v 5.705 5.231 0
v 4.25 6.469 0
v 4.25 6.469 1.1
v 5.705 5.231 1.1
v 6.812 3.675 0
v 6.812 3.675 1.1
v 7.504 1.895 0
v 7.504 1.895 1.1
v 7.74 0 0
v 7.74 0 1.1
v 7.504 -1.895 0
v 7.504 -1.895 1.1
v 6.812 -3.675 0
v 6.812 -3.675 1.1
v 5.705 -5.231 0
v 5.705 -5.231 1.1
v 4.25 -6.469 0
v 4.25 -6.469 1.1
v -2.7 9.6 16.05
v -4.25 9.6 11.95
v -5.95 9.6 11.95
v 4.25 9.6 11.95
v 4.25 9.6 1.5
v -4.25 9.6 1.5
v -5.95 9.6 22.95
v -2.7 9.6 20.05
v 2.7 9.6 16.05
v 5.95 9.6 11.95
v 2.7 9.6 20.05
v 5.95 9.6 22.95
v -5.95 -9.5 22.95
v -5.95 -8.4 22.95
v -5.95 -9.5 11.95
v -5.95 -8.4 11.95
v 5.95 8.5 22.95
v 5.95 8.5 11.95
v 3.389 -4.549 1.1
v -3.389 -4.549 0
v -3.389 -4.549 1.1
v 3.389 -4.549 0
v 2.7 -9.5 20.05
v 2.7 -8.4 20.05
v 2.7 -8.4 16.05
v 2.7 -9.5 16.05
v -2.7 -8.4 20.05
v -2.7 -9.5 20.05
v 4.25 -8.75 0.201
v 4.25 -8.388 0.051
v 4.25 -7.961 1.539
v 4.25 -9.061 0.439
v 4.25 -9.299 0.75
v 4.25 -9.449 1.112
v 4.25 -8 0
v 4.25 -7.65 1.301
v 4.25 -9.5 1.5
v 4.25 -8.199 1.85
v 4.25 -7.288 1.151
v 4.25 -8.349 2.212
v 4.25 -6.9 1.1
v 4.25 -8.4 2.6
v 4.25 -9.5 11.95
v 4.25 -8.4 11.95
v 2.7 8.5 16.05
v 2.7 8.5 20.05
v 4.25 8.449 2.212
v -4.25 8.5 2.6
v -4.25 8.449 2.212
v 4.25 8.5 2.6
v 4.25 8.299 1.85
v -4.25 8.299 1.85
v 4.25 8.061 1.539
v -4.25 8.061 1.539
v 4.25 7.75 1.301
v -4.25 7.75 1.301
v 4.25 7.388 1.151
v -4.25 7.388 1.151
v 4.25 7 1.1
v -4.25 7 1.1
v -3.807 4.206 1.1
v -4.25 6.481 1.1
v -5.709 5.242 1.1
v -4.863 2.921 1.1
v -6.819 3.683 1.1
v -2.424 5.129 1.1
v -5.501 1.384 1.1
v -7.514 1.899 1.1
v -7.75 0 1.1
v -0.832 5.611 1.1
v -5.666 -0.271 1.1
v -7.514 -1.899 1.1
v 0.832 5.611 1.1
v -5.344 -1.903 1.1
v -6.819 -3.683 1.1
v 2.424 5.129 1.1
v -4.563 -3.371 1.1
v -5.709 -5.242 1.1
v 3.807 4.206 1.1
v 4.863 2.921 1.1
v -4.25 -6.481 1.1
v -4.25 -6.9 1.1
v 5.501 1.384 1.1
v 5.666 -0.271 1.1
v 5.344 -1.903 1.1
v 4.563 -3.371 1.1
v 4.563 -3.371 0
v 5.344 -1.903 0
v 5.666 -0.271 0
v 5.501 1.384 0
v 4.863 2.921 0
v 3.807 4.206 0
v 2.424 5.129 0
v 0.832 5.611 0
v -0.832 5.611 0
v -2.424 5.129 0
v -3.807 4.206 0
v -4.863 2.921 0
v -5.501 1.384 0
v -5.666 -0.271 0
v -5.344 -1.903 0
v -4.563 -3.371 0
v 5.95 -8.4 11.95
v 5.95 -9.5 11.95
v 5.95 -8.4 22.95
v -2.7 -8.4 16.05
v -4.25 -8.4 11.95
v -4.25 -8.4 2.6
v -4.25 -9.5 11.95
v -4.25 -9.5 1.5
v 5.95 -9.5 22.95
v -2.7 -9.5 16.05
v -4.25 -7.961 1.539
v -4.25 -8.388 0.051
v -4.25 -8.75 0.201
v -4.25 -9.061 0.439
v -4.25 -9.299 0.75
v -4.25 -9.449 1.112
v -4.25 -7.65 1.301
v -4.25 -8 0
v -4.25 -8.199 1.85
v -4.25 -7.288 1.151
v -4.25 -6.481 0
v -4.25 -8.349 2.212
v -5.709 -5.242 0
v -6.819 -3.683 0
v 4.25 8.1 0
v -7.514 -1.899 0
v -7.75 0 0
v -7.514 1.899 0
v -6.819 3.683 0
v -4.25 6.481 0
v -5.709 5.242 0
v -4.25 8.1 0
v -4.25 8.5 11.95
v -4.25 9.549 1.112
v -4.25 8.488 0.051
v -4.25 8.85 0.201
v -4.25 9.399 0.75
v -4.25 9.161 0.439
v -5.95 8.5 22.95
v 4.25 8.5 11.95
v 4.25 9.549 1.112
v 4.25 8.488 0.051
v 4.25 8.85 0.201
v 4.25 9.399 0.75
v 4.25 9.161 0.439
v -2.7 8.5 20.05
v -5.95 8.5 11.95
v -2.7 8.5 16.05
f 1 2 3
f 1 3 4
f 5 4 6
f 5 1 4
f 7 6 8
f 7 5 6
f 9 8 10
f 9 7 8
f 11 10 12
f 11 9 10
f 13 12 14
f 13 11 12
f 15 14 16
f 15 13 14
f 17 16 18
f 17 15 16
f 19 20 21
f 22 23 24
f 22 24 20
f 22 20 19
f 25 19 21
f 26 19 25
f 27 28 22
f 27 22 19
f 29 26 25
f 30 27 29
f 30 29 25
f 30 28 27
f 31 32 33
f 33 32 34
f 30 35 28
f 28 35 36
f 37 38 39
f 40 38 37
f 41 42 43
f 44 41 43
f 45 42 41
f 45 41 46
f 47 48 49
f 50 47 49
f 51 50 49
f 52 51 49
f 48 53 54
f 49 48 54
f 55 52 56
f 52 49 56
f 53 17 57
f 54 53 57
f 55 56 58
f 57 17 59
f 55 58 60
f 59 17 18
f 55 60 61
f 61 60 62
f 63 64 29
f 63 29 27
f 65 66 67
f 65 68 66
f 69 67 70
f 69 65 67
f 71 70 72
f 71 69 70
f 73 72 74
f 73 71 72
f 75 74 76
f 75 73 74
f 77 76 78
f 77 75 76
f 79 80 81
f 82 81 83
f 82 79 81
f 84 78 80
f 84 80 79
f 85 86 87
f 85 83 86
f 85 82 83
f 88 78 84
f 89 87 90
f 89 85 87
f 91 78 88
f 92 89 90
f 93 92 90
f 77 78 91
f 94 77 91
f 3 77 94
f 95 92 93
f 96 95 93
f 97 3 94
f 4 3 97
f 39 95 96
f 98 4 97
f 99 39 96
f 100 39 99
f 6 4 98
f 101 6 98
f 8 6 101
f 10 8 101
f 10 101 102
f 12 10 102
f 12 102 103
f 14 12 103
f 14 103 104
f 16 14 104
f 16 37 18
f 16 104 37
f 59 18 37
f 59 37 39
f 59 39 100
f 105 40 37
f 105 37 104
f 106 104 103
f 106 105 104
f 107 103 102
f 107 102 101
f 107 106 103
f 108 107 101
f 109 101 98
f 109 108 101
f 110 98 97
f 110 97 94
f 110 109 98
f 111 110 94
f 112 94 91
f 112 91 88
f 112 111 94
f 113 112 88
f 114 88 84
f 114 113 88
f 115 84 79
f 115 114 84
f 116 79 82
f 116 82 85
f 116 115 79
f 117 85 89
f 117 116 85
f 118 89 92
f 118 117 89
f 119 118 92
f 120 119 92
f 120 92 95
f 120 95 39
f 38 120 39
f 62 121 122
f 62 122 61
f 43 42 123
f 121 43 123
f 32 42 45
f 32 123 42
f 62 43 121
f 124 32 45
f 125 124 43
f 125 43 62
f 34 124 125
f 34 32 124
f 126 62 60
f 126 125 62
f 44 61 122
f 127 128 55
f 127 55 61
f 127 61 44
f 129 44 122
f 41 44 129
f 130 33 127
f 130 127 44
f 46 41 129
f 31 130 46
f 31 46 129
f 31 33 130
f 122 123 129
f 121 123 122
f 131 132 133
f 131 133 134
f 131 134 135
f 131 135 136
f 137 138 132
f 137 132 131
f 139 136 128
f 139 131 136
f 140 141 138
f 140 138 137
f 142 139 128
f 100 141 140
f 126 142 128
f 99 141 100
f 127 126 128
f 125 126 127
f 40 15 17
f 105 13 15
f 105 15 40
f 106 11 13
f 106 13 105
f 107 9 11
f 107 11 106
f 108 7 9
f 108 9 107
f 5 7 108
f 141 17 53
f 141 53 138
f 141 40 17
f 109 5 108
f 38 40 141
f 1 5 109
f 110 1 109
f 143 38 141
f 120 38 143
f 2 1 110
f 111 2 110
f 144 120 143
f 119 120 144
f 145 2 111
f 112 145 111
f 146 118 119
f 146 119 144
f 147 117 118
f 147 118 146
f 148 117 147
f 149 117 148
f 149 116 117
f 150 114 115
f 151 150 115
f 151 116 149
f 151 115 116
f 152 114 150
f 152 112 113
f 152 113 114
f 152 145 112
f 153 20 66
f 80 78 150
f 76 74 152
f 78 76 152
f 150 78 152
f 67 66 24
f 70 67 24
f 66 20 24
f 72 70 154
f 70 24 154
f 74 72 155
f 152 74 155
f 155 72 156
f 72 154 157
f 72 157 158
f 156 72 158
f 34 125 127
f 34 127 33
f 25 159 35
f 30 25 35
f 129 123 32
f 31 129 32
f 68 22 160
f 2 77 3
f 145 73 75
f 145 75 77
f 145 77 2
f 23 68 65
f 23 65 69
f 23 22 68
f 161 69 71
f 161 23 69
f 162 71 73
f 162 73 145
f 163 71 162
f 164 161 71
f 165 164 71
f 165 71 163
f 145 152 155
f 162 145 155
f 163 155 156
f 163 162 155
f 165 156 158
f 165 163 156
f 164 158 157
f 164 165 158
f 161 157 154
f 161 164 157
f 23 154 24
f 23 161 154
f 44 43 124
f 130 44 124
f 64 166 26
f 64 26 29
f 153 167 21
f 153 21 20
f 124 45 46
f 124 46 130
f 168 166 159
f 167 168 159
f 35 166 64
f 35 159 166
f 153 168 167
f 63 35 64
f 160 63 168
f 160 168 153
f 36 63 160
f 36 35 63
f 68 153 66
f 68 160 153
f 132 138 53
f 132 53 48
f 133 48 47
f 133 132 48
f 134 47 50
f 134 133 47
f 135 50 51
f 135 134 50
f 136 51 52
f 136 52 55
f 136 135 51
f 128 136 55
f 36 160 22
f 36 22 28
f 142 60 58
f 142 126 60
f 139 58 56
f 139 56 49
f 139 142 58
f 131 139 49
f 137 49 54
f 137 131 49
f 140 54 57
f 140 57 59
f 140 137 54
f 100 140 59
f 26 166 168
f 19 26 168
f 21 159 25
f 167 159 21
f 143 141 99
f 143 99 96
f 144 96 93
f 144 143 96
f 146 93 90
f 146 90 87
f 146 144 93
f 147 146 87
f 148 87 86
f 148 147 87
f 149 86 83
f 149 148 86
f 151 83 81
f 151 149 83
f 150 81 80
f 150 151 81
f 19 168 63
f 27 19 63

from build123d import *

# Parameters (mm, degrees)
BOSS_EXTRUDE1_DEPTH = 1.1
SKETCH3_W           = 11.9
SKETCH3_H           = 11
SKETCH3_W_2         = 5.4
SKETCH3_H_2         = 4
BOSS_EXTRUDE2_DEPTH = 1.1
SKETCH4_W           = 11.9
SKETCH4_H           = 11
SKETCH4_W_2         = 5.4
SKETCH4_H_2         = 4
BOSS_EXTRUDE3_DEPTH = 1.1
BOSS_EXTRUDE4_DEPTH = 4.25


with BuildPart() as part:
    # Sketch1 → Boss-Extrude1 (new body)
    with BuildSketch(Plane.XY):
        with BuildLine():
            Line((3.951985261, -6.654962537), (-3.971646211, -6.654962537))
            ThreePointArc((-3.971646211, -6.654962537), (-7.748260545, -0.1641905), (-4.25, 6.480740698))
            Line((-4.25, 6.480740698), (4.25, 6.468710372))
            ThreePointArc((4.25, 6.468710372), (7.737947933, -0.175714722), (3.951985261, -6.654962537))
        make_face()
        with BuildLine():
            Line((-3.388637081, -4.549455129), (3.388637081, -4.549455129))
            ThreePointArc((3.388637081, -4.549455129), (0, 5.672777383), (-3.388637081, -4.549455129))
        make_face(mode=Mode.SUBTRACT)
    extrude(amount=BOSS_EXTRUDE1_DEPTH)



with BuildPart() as body_2:
    # Sketch3 → Boss-Extrude2 (new body)
    with BuildSketch(Plane(origin=(0, -8.4, 0), x_dir=(-1, 0, 0), z_dir=(0, -1, 0))):
        with Locations((0, -17.45)):
            Rectangle(SKETCH3_W, SKETCH3_H)
        with Locations((0, -18.05)):
            Rectangle(SKETCH3_W_2, SKETCH3_H_2, mode=Mode.SUBTRACT)
    extrude(amount=BOSS_EXTRUDE2_DEPTH)


with BuildPart() as body_3:
    # Sketch4 → Boss-Extrude3 (new body)
    with BuildSketch(Plane(origin=(0, 8.5, 0), x_dir=(1, 0, 0), z_dir=(0, 1, 0))):
        with Locations((0, -17.45)):
            Rectangle(SKETCH4_W, SKETCH4_H)
        with Locations((0, -18.05)):
            Rectangle(SKETCH4_W_2, SKETCH4_H_2, mode=Mode.SUBTRACT)
    extrude(amount=BOSS_EXTRUDE3_DEPTH)


with BuildPart() as part_1:
    add(part.part)

    add(body_2.part)  # Boss-Extrude4 merges body 2

    add(body_3.part)  # Boss-Extrude4 merges body 3
    # Sketch2 → Boss-Extrude4 (add, symmetric)
    with BuildSketch(Plane(origin=(0, 0, 0), x_dir=(0, 0, -1), z_dir=(1, 0, 0))):
        with BuildLine():
            Line((-1.1, -6.245079779), (0, -6.245079779))
            Line((0, -6.245079779), (0, -8))
            ThreePointArc((0, -8), (-0.439339828, -9.060660172), (-1.5, -9.5))
            Line((-1.5, -9.5), (-11.95, -9.5))
            Line((-11.95, -9.5), (-11.95, -8.4))
            Line((-11.95, -8.4), (-2.6, -8.4))
            ThreePointArc((-2.6, -8.4), (-1.539339828, -7.960660172), (-1.1, -6.9))
            Line((-1.1, -6.9), (-1.1, -6.245079779))
        make_face()
        with BuildLine():
            Line((-1.1, 6.20982384), (0, 6.20982384))
            Line((0, 6.20982384), (0, 8.1))
            ThreePointArc((0, 8.1), (-0.439339828, 9.160660172), (-1.5, 9.6))
            Line((-1.5, 9.6), (-11.95, 9.6))
            Line((-11.95, 9.6), (-11.95, 8.5))
            Line((-11.95, 8.5), (-2.6, 8.5))
            ThreePointArc((-2.6, 8.5), (-1.539339828, 8.060660172), (-1.1, 7))
            Line((-1.1, 7), (-1.1, 6.20982384))
        make_face()
    extrude(amount=BOSS_EXTRUDE4_DEPTH, both=True)


solid = part_1.part
